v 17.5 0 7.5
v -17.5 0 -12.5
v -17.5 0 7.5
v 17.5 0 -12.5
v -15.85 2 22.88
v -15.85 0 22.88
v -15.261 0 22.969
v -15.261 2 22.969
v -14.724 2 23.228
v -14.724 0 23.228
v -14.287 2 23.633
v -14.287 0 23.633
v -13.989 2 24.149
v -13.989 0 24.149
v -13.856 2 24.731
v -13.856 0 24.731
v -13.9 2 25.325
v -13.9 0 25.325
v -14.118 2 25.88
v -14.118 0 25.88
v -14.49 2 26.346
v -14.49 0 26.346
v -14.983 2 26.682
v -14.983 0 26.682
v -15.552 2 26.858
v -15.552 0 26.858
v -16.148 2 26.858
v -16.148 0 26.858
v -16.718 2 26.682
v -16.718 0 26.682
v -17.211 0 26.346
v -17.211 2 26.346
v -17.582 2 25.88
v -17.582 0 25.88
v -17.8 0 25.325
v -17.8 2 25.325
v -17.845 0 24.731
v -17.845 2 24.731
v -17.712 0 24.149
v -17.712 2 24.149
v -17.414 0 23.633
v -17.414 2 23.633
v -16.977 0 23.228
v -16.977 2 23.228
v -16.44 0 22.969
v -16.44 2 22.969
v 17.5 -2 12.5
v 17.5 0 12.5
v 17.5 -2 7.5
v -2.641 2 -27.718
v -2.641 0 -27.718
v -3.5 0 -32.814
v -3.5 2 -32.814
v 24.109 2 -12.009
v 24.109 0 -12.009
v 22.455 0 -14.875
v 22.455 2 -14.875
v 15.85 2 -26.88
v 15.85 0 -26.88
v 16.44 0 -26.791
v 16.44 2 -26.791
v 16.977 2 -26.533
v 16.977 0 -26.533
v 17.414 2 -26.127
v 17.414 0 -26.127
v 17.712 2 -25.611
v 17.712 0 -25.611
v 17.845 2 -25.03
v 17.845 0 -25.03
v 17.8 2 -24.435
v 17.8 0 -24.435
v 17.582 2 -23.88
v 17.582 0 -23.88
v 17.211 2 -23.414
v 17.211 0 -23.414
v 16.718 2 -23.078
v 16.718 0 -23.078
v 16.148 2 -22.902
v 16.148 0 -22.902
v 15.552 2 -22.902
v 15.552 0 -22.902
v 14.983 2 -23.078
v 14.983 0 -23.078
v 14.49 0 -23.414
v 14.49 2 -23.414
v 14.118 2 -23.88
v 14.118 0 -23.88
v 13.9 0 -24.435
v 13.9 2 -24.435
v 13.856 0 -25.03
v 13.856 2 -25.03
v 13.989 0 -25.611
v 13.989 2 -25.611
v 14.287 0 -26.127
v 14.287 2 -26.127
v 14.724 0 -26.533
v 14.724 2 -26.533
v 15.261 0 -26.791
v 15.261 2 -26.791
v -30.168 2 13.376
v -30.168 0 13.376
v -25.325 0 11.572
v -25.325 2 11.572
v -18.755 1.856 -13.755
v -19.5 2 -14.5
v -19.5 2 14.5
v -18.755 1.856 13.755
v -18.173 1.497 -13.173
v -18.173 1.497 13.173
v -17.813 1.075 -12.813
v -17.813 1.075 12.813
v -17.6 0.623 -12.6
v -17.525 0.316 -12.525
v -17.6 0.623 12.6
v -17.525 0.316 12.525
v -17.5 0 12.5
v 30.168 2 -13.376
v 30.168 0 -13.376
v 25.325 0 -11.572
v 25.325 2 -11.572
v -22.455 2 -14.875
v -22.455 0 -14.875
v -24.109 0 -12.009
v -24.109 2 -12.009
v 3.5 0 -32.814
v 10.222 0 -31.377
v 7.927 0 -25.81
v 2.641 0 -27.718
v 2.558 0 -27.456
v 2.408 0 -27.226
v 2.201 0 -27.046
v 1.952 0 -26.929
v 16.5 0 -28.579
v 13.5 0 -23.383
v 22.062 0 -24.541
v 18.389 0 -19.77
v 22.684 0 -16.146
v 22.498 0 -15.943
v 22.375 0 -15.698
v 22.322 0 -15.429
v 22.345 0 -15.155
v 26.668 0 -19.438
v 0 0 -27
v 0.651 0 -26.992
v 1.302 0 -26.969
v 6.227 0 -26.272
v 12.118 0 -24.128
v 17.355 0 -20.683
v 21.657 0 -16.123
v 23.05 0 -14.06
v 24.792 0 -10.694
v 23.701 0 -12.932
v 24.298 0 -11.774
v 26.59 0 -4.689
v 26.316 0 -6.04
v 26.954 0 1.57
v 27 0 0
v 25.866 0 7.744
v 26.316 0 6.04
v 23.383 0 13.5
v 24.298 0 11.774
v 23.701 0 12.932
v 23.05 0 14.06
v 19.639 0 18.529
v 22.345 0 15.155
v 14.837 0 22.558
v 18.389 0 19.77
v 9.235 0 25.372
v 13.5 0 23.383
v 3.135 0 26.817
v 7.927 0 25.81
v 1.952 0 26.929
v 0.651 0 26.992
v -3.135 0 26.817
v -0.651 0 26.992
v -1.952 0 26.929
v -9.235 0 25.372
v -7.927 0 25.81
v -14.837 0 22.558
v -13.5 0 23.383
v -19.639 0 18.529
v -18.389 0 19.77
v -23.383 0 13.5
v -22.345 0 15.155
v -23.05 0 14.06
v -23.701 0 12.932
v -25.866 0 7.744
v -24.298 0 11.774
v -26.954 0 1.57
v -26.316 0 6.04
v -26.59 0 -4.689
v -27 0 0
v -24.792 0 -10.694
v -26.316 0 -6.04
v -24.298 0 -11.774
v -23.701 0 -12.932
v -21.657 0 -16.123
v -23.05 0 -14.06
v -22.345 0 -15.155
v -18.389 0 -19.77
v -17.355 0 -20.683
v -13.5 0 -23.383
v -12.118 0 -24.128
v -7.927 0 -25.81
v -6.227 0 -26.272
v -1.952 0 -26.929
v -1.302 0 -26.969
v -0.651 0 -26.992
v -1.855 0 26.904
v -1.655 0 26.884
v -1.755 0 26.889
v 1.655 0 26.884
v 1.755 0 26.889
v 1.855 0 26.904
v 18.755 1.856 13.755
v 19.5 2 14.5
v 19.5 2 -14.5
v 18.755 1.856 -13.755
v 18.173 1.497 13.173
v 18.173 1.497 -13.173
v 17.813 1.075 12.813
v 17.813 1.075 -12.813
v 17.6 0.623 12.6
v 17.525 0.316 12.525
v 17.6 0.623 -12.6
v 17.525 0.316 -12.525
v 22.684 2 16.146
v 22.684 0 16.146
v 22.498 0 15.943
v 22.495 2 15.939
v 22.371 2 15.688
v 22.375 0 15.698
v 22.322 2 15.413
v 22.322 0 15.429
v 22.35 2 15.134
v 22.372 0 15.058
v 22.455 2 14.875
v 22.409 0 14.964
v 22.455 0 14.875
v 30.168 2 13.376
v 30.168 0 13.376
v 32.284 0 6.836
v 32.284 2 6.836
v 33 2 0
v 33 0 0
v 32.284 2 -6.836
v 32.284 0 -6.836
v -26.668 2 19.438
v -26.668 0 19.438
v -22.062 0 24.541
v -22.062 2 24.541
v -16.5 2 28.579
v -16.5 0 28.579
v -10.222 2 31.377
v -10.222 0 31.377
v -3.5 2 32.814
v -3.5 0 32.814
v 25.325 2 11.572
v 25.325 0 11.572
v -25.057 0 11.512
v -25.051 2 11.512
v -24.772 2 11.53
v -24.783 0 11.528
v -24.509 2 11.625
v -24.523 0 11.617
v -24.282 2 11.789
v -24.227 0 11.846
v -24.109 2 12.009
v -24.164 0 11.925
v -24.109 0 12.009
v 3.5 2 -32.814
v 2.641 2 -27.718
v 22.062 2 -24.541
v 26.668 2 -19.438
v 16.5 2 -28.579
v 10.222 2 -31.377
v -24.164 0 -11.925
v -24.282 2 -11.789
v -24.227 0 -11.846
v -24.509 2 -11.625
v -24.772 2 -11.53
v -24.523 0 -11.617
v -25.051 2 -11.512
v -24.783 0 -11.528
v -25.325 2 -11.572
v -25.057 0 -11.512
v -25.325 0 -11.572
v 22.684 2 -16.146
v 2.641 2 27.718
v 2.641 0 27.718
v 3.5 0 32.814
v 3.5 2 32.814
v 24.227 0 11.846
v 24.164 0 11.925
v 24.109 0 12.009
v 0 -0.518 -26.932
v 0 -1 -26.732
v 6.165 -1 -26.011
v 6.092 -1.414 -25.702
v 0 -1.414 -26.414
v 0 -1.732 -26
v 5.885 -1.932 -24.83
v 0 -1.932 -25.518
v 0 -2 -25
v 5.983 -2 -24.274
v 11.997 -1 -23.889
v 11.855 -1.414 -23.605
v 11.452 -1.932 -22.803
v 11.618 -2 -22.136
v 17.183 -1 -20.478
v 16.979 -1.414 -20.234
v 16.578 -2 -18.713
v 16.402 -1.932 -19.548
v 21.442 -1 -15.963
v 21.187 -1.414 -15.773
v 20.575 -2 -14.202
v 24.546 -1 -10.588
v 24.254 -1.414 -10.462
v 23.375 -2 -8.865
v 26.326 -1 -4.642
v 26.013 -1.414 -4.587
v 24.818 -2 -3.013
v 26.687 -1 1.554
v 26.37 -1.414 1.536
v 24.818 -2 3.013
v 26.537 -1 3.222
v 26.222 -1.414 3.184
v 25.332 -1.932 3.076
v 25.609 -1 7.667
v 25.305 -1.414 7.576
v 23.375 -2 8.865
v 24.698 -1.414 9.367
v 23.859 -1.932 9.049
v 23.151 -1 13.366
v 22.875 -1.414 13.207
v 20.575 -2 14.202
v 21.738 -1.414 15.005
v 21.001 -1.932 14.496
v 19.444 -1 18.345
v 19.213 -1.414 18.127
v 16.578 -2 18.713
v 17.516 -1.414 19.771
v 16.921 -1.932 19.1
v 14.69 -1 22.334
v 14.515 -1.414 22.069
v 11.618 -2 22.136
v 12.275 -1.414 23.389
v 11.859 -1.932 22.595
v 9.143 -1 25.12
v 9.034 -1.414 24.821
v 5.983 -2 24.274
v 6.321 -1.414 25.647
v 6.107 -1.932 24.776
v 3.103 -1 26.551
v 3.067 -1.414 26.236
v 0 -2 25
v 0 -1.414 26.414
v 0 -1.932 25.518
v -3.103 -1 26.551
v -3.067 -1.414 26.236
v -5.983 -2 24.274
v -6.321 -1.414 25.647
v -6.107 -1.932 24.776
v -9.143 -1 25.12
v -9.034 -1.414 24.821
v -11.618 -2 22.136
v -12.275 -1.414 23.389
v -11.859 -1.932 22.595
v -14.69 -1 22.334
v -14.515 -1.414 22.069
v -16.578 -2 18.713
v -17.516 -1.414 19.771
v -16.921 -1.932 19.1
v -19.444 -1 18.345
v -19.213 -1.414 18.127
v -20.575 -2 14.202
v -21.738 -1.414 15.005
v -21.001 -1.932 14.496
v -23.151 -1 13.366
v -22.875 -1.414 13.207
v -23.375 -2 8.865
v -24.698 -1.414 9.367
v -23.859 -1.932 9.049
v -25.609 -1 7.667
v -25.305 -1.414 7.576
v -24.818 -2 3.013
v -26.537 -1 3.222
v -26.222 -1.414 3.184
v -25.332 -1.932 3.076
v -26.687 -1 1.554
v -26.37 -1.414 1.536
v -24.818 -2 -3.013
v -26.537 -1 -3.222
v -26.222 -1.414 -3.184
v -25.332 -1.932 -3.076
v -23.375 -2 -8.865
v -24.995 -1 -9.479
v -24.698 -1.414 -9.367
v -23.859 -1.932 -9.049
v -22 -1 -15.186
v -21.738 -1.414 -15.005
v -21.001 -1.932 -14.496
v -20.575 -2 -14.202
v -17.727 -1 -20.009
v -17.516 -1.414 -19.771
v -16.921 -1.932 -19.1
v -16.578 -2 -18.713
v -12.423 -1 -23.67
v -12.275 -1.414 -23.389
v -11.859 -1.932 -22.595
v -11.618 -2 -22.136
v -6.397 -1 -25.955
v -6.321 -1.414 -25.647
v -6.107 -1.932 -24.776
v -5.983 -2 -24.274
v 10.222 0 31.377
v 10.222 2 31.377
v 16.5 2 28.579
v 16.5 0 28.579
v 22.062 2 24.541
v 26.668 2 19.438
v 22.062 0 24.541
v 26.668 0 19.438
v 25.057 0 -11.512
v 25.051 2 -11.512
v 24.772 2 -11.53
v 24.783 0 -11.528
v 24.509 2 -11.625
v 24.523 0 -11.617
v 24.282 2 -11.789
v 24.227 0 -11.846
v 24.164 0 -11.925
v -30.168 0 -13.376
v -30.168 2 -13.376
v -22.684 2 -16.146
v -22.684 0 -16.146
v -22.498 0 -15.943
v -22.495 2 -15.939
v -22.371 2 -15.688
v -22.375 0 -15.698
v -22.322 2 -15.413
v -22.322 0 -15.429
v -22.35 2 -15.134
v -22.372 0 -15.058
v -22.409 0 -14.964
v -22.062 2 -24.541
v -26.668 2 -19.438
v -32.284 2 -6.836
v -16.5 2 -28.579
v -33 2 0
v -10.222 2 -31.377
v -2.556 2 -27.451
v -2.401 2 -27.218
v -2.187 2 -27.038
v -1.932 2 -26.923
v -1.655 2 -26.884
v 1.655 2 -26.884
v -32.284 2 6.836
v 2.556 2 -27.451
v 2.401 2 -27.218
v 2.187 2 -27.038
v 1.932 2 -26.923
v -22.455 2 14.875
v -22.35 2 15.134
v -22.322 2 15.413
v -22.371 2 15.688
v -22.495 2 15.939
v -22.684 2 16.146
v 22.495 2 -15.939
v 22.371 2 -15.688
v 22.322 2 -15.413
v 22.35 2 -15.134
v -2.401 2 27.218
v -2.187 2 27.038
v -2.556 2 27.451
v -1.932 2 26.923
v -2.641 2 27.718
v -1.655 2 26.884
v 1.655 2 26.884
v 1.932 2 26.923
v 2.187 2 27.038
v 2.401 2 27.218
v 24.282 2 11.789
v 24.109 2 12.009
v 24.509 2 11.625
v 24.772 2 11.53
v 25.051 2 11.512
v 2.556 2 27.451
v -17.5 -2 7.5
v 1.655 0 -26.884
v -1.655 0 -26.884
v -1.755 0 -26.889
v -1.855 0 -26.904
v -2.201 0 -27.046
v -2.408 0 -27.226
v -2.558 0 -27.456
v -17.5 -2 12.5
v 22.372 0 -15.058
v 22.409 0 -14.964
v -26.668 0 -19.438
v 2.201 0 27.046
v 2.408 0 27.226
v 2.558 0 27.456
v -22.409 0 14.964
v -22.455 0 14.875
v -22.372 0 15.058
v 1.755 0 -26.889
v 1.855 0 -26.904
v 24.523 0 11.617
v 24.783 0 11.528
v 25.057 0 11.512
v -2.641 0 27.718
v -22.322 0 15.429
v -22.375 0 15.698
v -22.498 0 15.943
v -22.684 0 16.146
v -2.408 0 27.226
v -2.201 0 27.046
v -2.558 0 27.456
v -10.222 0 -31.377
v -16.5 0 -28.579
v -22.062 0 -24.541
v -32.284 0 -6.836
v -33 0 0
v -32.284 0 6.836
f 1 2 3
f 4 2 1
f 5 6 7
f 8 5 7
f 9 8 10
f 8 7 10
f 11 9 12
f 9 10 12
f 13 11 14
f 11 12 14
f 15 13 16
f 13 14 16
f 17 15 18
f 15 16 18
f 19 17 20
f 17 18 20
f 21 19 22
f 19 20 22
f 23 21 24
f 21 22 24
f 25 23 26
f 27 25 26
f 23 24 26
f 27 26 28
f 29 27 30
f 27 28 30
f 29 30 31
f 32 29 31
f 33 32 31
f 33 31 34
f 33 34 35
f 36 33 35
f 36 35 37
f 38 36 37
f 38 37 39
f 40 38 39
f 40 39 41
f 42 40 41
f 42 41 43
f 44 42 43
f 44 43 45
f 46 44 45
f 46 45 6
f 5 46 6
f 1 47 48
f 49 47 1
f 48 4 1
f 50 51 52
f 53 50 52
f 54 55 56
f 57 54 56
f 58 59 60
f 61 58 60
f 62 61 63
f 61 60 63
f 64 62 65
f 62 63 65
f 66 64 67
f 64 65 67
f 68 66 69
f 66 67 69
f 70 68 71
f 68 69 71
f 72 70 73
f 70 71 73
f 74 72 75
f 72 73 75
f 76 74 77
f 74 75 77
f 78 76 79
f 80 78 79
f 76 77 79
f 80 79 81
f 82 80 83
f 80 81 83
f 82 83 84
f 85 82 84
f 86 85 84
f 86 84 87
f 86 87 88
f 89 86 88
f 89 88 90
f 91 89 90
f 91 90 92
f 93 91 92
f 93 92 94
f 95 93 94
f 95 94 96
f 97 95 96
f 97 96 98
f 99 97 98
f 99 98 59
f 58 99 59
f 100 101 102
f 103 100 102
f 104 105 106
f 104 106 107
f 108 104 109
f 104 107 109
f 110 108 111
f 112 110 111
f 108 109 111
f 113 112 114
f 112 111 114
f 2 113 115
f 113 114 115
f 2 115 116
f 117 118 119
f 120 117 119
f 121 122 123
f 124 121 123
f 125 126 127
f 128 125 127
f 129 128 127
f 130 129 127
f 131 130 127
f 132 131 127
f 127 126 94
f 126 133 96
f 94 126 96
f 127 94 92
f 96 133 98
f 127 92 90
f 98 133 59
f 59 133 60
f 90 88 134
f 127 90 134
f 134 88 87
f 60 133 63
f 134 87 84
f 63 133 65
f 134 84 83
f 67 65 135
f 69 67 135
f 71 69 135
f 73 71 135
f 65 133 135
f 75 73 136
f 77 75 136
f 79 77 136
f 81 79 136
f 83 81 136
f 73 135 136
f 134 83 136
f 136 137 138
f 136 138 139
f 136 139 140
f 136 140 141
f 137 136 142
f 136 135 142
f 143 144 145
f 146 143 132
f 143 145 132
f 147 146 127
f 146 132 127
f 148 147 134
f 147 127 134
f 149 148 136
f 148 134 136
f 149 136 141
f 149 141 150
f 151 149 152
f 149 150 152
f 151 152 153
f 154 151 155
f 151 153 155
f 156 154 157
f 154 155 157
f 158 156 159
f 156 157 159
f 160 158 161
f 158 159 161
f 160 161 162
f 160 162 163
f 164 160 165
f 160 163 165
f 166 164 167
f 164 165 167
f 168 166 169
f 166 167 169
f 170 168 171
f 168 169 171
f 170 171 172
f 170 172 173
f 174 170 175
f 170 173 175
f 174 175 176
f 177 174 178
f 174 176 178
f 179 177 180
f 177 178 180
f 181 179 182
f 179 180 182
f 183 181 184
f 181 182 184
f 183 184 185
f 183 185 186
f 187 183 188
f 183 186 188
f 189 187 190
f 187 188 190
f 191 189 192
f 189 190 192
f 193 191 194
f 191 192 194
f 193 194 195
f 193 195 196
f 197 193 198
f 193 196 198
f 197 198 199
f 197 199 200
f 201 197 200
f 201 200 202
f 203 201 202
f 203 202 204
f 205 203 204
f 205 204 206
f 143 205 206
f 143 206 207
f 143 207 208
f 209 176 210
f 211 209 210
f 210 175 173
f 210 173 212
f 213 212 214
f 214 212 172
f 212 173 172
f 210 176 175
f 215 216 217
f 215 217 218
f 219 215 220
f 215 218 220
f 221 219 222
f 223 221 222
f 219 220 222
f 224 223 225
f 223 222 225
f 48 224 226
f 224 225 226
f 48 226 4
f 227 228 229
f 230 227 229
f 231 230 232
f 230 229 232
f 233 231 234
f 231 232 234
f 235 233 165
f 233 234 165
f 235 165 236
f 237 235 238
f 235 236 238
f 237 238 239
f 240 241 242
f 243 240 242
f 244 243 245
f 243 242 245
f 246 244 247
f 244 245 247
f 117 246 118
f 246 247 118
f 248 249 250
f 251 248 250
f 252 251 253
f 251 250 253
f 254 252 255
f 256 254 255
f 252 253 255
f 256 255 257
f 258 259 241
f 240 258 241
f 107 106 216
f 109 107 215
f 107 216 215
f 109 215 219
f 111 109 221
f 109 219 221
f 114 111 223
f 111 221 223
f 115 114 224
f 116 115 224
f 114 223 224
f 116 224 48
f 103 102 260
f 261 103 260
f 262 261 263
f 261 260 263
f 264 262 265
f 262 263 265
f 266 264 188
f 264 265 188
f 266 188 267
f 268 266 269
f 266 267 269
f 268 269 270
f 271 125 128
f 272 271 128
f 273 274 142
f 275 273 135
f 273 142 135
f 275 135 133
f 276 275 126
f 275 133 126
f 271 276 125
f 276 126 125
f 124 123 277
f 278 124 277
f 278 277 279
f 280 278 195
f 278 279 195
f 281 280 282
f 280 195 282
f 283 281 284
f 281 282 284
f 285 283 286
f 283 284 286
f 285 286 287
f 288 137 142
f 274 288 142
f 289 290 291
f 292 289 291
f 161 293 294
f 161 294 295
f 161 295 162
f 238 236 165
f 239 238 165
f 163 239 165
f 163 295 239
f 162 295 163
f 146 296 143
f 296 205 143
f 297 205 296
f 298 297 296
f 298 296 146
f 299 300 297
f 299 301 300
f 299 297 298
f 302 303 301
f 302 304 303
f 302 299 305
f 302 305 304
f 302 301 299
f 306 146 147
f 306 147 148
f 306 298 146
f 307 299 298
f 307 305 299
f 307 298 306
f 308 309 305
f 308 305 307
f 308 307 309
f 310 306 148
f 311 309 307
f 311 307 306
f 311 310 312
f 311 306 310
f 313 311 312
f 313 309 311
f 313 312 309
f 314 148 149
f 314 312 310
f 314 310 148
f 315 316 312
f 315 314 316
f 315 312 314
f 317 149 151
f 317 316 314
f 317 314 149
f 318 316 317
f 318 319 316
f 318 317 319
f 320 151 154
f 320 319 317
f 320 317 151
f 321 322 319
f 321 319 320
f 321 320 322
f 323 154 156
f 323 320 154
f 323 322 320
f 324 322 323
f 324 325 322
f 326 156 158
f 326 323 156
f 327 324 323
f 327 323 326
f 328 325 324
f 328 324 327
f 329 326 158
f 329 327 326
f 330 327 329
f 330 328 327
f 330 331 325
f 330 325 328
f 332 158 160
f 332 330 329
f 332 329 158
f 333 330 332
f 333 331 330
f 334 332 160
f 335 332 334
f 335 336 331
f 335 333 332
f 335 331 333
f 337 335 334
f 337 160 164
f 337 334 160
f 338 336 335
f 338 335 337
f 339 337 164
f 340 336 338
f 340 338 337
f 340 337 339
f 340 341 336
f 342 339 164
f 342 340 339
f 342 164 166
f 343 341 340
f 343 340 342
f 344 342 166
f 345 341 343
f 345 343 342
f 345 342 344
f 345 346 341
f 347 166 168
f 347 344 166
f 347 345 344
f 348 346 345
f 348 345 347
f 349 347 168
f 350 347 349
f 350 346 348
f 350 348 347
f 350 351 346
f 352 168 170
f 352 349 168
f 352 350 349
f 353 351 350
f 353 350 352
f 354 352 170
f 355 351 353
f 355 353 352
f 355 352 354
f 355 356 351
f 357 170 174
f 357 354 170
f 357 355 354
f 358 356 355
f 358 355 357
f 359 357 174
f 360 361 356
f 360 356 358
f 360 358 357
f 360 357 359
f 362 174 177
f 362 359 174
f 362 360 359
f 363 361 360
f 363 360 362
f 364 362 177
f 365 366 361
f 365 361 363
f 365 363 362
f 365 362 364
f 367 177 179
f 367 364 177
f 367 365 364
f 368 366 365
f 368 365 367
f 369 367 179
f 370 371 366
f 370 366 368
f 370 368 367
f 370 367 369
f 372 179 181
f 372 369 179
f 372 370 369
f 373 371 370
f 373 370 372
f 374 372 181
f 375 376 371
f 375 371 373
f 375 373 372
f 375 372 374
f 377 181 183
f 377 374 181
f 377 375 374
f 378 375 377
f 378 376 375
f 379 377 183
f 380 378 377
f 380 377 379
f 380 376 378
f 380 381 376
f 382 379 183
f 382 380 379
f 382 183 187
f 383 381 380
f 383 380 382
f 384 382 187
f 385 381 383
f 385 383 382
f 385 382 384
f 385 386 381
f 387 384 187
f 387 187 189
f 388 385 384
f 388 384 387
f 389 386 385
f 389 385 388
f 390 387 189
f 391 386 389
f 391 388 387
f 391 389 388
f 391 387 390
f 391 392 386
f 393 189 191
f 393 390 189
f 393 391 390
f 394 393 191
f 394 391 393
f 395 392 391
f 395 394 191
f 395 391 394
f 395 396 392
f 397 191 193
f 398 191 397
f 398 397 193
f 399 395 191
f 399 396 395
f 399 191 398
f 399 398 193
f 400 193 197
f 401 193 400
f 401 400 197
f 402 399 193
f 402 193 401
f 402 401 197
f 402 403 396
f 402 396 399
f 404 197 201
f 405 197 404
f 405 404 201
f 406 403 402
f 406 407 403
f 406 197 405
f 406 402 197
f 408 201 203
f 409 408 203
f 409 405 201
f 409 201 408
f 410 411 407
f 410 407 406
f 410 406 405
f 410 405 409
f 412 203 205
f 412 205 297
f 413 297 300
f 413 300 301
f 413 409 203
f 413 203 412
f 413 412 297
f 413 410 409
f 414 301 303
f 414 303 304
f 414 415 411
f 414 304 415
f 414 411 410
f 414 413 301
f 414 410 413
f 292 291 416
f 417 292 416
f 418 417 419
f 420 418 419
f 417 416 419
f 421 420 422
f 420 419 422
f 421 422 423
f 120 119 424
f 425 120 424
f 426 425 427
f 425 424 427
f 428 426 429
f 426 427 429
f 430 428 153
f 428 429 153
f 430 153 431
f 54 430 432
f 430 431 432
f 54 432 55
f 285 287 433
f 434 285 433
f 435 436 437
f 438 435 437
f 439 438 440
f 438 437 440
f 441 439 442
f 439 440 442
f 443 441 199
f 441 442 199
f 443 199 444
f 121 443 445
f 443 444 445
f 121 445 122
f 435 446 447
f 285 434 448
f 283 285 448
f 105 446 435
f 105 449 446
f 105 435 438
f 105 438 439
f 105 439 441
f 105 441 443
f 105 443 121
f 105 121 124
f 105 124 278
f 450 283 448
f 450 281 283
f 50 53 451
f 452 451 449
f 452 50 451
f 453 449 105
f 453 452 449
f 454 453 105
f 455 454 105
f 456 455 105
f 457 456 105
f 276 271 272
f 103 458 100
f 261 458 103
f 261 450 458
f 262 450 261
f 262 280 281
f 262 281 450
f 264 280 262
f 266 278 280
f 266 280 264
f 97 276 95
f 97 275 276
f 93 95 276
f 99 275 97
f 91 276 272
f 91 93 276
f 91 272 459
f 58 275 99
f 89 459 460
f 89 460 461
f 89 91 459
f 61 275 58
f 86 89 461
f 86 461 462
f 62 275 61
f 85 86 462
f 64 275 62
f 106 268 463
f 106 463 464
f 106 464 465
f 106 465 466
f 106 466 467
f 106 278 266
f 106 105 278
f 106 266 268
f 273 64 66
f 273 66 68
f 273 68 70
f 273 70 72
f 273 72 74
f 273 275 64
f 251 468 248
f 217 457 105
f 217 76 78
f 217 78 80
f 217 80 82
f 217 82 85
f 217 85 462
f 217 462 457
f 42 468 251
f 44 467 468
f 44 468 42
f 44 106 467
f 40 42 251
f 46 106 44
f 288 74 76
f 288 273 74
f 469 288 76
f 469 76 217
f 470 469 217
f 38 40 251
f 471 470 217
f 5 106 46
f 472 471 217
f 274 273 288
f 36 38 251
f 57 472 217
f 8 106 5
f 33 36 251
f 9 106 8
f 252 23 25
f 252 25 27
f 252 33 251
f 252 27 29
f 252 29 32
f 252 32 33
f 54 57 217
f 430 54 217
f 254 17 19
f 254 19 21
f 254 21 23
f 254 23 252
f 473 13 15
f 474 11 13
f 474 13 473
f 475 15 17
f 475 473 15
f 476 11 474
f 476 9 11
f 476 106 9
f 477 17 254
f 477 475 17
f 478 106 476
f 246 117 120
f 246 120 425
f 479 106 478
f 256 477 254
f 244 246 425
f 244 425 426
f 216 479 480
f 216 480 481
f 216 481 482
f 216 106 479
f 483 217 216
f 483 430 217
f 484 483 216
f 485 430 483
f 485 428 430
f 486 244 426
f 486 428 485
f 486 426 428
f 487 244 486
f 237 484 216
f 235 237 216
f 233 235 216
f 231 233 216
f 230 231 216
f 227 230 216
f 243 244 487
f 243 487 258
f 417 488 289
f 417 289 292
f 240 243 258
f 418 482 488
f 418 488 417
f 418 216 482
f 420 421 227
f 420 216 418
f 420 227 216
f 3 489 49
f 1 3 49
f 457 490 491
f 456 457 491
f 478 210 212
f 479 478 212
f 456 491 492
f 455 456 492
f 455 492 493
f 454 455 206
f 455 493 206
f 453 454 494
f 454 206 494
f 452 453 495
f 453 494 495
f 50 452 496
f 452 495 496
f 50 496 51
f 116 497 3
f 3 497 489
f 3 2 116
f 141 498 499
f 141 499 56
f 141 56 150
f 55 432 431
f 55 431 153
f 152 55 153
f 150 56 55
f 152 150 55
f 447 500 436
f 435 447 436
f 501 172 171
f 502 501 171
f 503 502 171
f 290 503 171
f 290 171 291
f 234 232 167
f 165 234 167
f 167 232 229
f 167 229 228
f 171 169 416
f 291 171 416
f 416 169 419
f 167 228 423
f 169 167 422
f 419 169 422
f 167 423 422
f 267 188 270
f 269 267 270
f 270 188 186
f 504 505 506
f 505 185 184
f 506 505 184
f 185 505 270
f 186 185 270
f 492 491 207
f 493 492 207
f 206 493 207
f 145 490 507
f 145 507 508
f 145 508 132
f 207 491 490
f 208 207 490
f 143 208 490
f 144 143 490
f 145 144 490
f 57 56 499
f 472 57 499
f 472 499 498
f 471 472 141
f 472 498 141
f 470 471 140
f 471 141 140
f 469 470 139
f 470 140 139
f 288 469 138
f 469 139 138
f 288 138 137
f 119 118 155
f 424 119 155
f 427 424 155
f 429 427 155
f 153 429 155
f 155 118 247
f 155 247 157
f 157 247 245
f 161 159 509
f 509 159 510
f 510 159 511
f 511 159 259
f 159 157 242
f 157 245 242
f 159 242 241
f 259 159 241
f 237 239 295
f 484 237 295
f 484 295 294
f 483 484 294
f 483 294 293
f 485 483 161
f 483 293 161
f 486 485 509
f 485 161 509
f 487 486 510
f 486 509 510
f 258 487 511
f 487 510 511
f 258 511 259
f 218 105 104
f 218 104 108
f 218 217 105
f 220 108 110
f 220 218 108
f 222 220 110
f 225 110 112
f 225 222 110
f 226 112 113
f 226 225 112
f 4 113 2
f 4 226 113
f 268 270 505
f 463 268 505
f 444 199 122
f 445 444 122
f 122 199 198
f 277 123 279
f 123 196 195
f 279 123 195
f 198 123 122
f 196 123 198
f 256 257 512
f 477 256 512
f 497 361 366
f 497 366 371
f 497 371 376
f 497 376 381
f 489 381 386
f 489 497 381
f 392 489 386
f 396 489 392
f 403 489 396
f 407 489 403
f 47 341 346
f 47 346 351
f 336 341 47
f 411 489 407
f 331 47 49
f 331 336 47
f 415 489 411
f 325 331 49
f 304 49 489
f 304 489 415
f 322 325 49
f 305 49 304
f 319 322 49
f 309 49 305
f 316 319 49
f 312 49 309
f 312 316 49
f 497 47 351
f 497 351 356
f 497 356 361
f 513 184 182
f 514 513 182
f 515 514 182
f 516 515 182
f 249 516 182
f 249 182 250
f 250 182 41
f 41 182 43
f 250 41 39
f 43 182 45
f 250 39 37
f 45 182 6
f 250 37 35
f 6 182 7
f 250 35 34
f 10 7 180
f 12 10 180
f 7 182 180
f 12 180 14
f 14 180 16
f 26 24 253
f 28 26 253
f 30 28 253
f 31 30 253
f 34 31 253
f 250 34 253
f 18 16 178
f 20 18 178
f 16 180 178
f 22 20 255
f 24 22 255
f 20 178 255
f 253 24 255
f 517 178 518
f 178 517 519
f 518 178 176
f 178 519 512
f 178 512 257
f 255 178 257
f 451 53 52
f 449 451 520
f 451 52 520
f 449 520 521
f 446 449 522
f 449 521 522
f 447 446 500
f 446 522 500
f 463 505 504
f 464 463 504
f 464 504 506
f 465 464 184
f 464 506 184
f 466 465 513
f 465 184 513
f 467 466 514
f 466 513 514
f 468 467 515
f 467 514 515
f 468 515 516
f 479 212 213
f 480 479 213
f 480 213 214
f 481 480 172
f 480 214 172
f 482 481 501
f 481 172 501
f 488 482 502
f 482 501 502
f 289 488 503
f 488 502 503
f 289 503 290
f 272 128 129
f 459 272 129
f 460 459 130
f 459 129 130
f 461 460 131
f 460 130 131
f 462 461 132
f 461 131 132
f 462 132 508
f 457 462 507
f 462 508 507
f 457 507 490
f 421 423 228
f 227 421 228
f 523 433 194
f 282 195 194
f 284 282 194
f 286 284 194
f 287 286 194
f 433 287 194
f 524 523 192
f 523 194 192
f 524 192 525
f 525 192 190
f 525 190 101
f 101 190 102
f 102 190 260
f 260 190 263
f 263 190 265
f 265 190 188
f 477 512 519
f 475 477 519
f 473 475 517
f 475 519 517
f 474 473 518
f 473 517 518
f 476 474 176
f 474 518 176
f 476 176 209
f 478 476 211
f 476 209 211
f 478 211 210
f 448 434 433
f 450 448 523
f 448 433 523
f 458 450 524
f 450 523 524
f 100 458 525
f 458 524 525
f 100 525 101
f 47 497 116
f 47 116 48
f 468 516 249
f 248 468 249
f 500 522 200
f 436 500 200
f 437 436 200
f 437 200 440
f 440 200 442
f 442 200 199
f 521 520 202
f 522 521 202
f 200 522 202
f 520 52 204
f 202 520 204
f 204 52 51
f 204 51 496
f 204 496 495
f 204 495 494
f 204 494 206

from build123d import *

# Parameters (mm, degrees)
SKETCH1_R               = 33
BOSS_EXTRUDE1_DEPTH     = 2
SKETCH5_R               = 27
BOSS_EXTRUDE2_DEPTH     = 2
SKETCH7_W               = 35
SKETCH7_H               = 25
CUT_EXTRUDE2_DEPTH      = 2
FILLET5_R               = 2
CUT_EXTRUDE3_DEPTH      = 47.840153715
CUT_EXTRUDE3_DEPTH_BACK = 47.840153715
SKETCH8_W               = 35
SKETCH8_H               = 5
FILLET3_R               = 2
SKETCH6_R               = 2
CUT_EXTRUDE4_DEPTH      = 10


with BuildPart() as part:
    # Sketch1 → Boss-Extrude1 (new body)
    with BuildSketch(Plane(origin=(0, 0, 0), x_dir=(1, 0, 0), z_dir=(0, 1, 0))):
        with Locations(Location((0, 0, 0), (0, 0, 270))):
            Circle(SKETCH1_R)
    extrude(amount=BOSS_EXTRUDE1_DEPTH)

    # Sketch5 → Boss-Extrude2 (add)
    with BuildSketch(Plane.XZ):
        with Locations(Location((0, 0, 0), (0, 0, 270))):
            Circle(SKETCH5_R)
    extrude(amount=BOSS_EXTRUDE2_DEPTH)

    # Sketch7 → Cut-Extrude2 (cut)
    with BuildSketch(Plane(origin=(0, 2, 0), x_dir=(1, 0, 0), z_dir=(0, 1, 0))):
        Rectangle(SKETCH7_W, SKETCH7_H)
    extrude(amount=-CUT_EXTRUDE2_DEPTH, mode=Mode.SUBTRACT)

    # Fillet5
    fillet5_edges = [part.edges().sort_by_distance(p)[0] for p in [
        (0, -2, 27),
    ]]
    fillet(fillet5_edges, radius=FILLET5_R - 0.0001)  # a hair under: the kernel refuses the full size

    # Sketch8 → Cut-Extrude3 (cut, two sides: drawn at the far end of the back side and taken through both)
    with BuildSketch(Plane(origin=(0, 2, 0), x_dir=(1, 0, 0), z_dir=(0, 1, 0)).offset(-CUT_EXTRUDE3_DEPTH_BACK)):
        with Locations((0, -10)):
            Rectangle(SKETCH8_W, SKETCH8_H)
    extrude(amount=CUT_EXTRUDE3_DEPTH + CUT_EXTRUDE3_DEPTH_BACK, mode=Mode.SUBTRACT)

    # Fillet3
    fillet3_edges = [part.edges().sort_by_distance(p)[0] for p in [
        (0, 2, 12.5),
        (-17.5, 2, 0),
        (0, 2, -12.5),
        (17.5, 2, 0),
    ]]
    fillet(fillet3_edges, radius=FILLET3_R - 0.0001)  # a hair under: the kernel refuses the full size

    # Sketch6 → Cut-Extrude4 (cut)
    with BuildSketch(Plane.XZ):
        with BuildLine():
            ThreePointArc((3.5, 32.813869019), (0, 33), (-3.5, 32.813869019))
            Line((-3.5, 32.813869019), (-2.640595233, 27.71772001))
            ThreePointArc((-2.640595233, 27.71772001), (-2.300161408, 27.12037077), (-1.654518359, 26.884010118))
            Line((-1.654518359, 26.884010118), (1.654518359, 26.884010118))
            ThreePointArc((1.654518359, 26.884010118), (2.300161408, 27.12037077), (2.640595233, 27.71772001))
            Line((2.640595233, 27.71772001), (3.5, 32.813869019))
        make_face()
        with BuildLine():
            Line((25.32454728, 11.572037452), (30.167644167, 13.375845596))
            ThreePointArc((30.167644167, 13.375845596), (28.578838325, 16.5), (26.667644167, 19.438023423))
            Line((26.667644167, 19.438023423), (22.683952047, 16.145682558))
            ThreePointArc((22.683952047, 16.145682558), (22.336849342, 15.552183597), (22.454976538, 14.874859989))
            Line((22.454976538, 14.874859989), (24.109494897, 12.009150128))
            ThreePointArc((24.109494897, 12.009150128), (24.637010751, 11.568187173), (25.32454728, 11.572037452))
        make_face()
        with Locations(Location((-15.850338446, 24.880047651, 0), (0, 0, 270))):
            Circle(SKETCH6_R)
        with BuildLine():
            Line((-30.167644167, 13.375845596), (-25.32454728, 11.572037452))
            ThreePointArc((-25.32454728, 11.572037452), (-24.637010751, 11.568187173), (-24.109494897, 12.009150128))
            Line((-24.109494897, 12.009150128), (-22.454976538, 14.874859989))
            ThreePointArc((-22.454976538, 14.874859989), (-22.336849342, 15.552183597), (-22.683952047, 16.145682558))
            Line((-22.683952047, 16.145682558), (-26.667644167, 19.438023423))
            ThreePointArc((-26.667644167, 19.438023423), (-28.578838325, 16.5), (-30.167644167, 13.375845596))
        make_face()
        with BuildLine():
            Line((22.683952047, -16.145682558), (26.667644167, -19.438023423))
            ThreePointArc((26.667644167, -19.438023423), (28.578838325, -16.5), (30.167644167, -13.375845596))
            Line((30.167644167, -13.375845596), (25.32454728, -11.572037452))
            ThreePointArc((25.32454728, -11.572037452), (24.637010751, -11.568187173), (24.109494897, -12.009150128))
            Line((24.109494897, -12.009150128), (22.454976538, -14.874859989))
            ThreePointArc((22.454976538, -14.874859989), (22.336849342, -15.552183597), (22.683952047, -16.145682558))
        make_face()
        with Locations(Location((15.850338446, -24.880047651, 0), (0, 0, 270))):
            Circle(SKETCH6_R)
        with BuildLine():
            Line((-26.667644167, -19.438023423), (-22.683952047, -16.145682558))
            ThreePointArc((-22.683952047, -16.145682558), (-22.336849342, -15.552183597), (-22.454976538, -14.874859989))
            Line((-22.454976538, -14.874859989), (-24.109494897, -12.009150128))
            ThreePointArc((-24.109494897, -12.009150128), (-24.637010751, -11.568187173), (-25.32454728, -11.572037452))
            Line((-25.32454728, -11.572037452), (-30.167644167, -13.375845596))
            ThreePointArc((-30.167644167, -13.375845596), (-28.578838325, -16.5), (-26.667644167, -19.438023423))
        make_face()
        with BuildLine():
            Line((-2.640595233, -27.71772001), (-3.5, -32.813869019))
            ThreePointArc((-3.5, -32.813869019), (0, -33), (3.5, -32.813869019))
            Line((3.5, -32.813869019), (2.640595233, -27.71772001))
            ThreePointArc((2.640595233, -27.71772001), (2.300161408, -27.12037077), (1.654518359, -26.884010118))
            Line((1.654518359, -26.884010118), (-1.654518359, -26.884010118))
            ThreePointArc((-1.654518359, -26.884010118), (-2.300161408, -27.12037077), (-2.640595233, -27.71772001))
        make_face()
    extrude(amount=-CUT_EXTRUDE4_DEPTH, mode=Mode.SUBTRACT)


solid = part.part
